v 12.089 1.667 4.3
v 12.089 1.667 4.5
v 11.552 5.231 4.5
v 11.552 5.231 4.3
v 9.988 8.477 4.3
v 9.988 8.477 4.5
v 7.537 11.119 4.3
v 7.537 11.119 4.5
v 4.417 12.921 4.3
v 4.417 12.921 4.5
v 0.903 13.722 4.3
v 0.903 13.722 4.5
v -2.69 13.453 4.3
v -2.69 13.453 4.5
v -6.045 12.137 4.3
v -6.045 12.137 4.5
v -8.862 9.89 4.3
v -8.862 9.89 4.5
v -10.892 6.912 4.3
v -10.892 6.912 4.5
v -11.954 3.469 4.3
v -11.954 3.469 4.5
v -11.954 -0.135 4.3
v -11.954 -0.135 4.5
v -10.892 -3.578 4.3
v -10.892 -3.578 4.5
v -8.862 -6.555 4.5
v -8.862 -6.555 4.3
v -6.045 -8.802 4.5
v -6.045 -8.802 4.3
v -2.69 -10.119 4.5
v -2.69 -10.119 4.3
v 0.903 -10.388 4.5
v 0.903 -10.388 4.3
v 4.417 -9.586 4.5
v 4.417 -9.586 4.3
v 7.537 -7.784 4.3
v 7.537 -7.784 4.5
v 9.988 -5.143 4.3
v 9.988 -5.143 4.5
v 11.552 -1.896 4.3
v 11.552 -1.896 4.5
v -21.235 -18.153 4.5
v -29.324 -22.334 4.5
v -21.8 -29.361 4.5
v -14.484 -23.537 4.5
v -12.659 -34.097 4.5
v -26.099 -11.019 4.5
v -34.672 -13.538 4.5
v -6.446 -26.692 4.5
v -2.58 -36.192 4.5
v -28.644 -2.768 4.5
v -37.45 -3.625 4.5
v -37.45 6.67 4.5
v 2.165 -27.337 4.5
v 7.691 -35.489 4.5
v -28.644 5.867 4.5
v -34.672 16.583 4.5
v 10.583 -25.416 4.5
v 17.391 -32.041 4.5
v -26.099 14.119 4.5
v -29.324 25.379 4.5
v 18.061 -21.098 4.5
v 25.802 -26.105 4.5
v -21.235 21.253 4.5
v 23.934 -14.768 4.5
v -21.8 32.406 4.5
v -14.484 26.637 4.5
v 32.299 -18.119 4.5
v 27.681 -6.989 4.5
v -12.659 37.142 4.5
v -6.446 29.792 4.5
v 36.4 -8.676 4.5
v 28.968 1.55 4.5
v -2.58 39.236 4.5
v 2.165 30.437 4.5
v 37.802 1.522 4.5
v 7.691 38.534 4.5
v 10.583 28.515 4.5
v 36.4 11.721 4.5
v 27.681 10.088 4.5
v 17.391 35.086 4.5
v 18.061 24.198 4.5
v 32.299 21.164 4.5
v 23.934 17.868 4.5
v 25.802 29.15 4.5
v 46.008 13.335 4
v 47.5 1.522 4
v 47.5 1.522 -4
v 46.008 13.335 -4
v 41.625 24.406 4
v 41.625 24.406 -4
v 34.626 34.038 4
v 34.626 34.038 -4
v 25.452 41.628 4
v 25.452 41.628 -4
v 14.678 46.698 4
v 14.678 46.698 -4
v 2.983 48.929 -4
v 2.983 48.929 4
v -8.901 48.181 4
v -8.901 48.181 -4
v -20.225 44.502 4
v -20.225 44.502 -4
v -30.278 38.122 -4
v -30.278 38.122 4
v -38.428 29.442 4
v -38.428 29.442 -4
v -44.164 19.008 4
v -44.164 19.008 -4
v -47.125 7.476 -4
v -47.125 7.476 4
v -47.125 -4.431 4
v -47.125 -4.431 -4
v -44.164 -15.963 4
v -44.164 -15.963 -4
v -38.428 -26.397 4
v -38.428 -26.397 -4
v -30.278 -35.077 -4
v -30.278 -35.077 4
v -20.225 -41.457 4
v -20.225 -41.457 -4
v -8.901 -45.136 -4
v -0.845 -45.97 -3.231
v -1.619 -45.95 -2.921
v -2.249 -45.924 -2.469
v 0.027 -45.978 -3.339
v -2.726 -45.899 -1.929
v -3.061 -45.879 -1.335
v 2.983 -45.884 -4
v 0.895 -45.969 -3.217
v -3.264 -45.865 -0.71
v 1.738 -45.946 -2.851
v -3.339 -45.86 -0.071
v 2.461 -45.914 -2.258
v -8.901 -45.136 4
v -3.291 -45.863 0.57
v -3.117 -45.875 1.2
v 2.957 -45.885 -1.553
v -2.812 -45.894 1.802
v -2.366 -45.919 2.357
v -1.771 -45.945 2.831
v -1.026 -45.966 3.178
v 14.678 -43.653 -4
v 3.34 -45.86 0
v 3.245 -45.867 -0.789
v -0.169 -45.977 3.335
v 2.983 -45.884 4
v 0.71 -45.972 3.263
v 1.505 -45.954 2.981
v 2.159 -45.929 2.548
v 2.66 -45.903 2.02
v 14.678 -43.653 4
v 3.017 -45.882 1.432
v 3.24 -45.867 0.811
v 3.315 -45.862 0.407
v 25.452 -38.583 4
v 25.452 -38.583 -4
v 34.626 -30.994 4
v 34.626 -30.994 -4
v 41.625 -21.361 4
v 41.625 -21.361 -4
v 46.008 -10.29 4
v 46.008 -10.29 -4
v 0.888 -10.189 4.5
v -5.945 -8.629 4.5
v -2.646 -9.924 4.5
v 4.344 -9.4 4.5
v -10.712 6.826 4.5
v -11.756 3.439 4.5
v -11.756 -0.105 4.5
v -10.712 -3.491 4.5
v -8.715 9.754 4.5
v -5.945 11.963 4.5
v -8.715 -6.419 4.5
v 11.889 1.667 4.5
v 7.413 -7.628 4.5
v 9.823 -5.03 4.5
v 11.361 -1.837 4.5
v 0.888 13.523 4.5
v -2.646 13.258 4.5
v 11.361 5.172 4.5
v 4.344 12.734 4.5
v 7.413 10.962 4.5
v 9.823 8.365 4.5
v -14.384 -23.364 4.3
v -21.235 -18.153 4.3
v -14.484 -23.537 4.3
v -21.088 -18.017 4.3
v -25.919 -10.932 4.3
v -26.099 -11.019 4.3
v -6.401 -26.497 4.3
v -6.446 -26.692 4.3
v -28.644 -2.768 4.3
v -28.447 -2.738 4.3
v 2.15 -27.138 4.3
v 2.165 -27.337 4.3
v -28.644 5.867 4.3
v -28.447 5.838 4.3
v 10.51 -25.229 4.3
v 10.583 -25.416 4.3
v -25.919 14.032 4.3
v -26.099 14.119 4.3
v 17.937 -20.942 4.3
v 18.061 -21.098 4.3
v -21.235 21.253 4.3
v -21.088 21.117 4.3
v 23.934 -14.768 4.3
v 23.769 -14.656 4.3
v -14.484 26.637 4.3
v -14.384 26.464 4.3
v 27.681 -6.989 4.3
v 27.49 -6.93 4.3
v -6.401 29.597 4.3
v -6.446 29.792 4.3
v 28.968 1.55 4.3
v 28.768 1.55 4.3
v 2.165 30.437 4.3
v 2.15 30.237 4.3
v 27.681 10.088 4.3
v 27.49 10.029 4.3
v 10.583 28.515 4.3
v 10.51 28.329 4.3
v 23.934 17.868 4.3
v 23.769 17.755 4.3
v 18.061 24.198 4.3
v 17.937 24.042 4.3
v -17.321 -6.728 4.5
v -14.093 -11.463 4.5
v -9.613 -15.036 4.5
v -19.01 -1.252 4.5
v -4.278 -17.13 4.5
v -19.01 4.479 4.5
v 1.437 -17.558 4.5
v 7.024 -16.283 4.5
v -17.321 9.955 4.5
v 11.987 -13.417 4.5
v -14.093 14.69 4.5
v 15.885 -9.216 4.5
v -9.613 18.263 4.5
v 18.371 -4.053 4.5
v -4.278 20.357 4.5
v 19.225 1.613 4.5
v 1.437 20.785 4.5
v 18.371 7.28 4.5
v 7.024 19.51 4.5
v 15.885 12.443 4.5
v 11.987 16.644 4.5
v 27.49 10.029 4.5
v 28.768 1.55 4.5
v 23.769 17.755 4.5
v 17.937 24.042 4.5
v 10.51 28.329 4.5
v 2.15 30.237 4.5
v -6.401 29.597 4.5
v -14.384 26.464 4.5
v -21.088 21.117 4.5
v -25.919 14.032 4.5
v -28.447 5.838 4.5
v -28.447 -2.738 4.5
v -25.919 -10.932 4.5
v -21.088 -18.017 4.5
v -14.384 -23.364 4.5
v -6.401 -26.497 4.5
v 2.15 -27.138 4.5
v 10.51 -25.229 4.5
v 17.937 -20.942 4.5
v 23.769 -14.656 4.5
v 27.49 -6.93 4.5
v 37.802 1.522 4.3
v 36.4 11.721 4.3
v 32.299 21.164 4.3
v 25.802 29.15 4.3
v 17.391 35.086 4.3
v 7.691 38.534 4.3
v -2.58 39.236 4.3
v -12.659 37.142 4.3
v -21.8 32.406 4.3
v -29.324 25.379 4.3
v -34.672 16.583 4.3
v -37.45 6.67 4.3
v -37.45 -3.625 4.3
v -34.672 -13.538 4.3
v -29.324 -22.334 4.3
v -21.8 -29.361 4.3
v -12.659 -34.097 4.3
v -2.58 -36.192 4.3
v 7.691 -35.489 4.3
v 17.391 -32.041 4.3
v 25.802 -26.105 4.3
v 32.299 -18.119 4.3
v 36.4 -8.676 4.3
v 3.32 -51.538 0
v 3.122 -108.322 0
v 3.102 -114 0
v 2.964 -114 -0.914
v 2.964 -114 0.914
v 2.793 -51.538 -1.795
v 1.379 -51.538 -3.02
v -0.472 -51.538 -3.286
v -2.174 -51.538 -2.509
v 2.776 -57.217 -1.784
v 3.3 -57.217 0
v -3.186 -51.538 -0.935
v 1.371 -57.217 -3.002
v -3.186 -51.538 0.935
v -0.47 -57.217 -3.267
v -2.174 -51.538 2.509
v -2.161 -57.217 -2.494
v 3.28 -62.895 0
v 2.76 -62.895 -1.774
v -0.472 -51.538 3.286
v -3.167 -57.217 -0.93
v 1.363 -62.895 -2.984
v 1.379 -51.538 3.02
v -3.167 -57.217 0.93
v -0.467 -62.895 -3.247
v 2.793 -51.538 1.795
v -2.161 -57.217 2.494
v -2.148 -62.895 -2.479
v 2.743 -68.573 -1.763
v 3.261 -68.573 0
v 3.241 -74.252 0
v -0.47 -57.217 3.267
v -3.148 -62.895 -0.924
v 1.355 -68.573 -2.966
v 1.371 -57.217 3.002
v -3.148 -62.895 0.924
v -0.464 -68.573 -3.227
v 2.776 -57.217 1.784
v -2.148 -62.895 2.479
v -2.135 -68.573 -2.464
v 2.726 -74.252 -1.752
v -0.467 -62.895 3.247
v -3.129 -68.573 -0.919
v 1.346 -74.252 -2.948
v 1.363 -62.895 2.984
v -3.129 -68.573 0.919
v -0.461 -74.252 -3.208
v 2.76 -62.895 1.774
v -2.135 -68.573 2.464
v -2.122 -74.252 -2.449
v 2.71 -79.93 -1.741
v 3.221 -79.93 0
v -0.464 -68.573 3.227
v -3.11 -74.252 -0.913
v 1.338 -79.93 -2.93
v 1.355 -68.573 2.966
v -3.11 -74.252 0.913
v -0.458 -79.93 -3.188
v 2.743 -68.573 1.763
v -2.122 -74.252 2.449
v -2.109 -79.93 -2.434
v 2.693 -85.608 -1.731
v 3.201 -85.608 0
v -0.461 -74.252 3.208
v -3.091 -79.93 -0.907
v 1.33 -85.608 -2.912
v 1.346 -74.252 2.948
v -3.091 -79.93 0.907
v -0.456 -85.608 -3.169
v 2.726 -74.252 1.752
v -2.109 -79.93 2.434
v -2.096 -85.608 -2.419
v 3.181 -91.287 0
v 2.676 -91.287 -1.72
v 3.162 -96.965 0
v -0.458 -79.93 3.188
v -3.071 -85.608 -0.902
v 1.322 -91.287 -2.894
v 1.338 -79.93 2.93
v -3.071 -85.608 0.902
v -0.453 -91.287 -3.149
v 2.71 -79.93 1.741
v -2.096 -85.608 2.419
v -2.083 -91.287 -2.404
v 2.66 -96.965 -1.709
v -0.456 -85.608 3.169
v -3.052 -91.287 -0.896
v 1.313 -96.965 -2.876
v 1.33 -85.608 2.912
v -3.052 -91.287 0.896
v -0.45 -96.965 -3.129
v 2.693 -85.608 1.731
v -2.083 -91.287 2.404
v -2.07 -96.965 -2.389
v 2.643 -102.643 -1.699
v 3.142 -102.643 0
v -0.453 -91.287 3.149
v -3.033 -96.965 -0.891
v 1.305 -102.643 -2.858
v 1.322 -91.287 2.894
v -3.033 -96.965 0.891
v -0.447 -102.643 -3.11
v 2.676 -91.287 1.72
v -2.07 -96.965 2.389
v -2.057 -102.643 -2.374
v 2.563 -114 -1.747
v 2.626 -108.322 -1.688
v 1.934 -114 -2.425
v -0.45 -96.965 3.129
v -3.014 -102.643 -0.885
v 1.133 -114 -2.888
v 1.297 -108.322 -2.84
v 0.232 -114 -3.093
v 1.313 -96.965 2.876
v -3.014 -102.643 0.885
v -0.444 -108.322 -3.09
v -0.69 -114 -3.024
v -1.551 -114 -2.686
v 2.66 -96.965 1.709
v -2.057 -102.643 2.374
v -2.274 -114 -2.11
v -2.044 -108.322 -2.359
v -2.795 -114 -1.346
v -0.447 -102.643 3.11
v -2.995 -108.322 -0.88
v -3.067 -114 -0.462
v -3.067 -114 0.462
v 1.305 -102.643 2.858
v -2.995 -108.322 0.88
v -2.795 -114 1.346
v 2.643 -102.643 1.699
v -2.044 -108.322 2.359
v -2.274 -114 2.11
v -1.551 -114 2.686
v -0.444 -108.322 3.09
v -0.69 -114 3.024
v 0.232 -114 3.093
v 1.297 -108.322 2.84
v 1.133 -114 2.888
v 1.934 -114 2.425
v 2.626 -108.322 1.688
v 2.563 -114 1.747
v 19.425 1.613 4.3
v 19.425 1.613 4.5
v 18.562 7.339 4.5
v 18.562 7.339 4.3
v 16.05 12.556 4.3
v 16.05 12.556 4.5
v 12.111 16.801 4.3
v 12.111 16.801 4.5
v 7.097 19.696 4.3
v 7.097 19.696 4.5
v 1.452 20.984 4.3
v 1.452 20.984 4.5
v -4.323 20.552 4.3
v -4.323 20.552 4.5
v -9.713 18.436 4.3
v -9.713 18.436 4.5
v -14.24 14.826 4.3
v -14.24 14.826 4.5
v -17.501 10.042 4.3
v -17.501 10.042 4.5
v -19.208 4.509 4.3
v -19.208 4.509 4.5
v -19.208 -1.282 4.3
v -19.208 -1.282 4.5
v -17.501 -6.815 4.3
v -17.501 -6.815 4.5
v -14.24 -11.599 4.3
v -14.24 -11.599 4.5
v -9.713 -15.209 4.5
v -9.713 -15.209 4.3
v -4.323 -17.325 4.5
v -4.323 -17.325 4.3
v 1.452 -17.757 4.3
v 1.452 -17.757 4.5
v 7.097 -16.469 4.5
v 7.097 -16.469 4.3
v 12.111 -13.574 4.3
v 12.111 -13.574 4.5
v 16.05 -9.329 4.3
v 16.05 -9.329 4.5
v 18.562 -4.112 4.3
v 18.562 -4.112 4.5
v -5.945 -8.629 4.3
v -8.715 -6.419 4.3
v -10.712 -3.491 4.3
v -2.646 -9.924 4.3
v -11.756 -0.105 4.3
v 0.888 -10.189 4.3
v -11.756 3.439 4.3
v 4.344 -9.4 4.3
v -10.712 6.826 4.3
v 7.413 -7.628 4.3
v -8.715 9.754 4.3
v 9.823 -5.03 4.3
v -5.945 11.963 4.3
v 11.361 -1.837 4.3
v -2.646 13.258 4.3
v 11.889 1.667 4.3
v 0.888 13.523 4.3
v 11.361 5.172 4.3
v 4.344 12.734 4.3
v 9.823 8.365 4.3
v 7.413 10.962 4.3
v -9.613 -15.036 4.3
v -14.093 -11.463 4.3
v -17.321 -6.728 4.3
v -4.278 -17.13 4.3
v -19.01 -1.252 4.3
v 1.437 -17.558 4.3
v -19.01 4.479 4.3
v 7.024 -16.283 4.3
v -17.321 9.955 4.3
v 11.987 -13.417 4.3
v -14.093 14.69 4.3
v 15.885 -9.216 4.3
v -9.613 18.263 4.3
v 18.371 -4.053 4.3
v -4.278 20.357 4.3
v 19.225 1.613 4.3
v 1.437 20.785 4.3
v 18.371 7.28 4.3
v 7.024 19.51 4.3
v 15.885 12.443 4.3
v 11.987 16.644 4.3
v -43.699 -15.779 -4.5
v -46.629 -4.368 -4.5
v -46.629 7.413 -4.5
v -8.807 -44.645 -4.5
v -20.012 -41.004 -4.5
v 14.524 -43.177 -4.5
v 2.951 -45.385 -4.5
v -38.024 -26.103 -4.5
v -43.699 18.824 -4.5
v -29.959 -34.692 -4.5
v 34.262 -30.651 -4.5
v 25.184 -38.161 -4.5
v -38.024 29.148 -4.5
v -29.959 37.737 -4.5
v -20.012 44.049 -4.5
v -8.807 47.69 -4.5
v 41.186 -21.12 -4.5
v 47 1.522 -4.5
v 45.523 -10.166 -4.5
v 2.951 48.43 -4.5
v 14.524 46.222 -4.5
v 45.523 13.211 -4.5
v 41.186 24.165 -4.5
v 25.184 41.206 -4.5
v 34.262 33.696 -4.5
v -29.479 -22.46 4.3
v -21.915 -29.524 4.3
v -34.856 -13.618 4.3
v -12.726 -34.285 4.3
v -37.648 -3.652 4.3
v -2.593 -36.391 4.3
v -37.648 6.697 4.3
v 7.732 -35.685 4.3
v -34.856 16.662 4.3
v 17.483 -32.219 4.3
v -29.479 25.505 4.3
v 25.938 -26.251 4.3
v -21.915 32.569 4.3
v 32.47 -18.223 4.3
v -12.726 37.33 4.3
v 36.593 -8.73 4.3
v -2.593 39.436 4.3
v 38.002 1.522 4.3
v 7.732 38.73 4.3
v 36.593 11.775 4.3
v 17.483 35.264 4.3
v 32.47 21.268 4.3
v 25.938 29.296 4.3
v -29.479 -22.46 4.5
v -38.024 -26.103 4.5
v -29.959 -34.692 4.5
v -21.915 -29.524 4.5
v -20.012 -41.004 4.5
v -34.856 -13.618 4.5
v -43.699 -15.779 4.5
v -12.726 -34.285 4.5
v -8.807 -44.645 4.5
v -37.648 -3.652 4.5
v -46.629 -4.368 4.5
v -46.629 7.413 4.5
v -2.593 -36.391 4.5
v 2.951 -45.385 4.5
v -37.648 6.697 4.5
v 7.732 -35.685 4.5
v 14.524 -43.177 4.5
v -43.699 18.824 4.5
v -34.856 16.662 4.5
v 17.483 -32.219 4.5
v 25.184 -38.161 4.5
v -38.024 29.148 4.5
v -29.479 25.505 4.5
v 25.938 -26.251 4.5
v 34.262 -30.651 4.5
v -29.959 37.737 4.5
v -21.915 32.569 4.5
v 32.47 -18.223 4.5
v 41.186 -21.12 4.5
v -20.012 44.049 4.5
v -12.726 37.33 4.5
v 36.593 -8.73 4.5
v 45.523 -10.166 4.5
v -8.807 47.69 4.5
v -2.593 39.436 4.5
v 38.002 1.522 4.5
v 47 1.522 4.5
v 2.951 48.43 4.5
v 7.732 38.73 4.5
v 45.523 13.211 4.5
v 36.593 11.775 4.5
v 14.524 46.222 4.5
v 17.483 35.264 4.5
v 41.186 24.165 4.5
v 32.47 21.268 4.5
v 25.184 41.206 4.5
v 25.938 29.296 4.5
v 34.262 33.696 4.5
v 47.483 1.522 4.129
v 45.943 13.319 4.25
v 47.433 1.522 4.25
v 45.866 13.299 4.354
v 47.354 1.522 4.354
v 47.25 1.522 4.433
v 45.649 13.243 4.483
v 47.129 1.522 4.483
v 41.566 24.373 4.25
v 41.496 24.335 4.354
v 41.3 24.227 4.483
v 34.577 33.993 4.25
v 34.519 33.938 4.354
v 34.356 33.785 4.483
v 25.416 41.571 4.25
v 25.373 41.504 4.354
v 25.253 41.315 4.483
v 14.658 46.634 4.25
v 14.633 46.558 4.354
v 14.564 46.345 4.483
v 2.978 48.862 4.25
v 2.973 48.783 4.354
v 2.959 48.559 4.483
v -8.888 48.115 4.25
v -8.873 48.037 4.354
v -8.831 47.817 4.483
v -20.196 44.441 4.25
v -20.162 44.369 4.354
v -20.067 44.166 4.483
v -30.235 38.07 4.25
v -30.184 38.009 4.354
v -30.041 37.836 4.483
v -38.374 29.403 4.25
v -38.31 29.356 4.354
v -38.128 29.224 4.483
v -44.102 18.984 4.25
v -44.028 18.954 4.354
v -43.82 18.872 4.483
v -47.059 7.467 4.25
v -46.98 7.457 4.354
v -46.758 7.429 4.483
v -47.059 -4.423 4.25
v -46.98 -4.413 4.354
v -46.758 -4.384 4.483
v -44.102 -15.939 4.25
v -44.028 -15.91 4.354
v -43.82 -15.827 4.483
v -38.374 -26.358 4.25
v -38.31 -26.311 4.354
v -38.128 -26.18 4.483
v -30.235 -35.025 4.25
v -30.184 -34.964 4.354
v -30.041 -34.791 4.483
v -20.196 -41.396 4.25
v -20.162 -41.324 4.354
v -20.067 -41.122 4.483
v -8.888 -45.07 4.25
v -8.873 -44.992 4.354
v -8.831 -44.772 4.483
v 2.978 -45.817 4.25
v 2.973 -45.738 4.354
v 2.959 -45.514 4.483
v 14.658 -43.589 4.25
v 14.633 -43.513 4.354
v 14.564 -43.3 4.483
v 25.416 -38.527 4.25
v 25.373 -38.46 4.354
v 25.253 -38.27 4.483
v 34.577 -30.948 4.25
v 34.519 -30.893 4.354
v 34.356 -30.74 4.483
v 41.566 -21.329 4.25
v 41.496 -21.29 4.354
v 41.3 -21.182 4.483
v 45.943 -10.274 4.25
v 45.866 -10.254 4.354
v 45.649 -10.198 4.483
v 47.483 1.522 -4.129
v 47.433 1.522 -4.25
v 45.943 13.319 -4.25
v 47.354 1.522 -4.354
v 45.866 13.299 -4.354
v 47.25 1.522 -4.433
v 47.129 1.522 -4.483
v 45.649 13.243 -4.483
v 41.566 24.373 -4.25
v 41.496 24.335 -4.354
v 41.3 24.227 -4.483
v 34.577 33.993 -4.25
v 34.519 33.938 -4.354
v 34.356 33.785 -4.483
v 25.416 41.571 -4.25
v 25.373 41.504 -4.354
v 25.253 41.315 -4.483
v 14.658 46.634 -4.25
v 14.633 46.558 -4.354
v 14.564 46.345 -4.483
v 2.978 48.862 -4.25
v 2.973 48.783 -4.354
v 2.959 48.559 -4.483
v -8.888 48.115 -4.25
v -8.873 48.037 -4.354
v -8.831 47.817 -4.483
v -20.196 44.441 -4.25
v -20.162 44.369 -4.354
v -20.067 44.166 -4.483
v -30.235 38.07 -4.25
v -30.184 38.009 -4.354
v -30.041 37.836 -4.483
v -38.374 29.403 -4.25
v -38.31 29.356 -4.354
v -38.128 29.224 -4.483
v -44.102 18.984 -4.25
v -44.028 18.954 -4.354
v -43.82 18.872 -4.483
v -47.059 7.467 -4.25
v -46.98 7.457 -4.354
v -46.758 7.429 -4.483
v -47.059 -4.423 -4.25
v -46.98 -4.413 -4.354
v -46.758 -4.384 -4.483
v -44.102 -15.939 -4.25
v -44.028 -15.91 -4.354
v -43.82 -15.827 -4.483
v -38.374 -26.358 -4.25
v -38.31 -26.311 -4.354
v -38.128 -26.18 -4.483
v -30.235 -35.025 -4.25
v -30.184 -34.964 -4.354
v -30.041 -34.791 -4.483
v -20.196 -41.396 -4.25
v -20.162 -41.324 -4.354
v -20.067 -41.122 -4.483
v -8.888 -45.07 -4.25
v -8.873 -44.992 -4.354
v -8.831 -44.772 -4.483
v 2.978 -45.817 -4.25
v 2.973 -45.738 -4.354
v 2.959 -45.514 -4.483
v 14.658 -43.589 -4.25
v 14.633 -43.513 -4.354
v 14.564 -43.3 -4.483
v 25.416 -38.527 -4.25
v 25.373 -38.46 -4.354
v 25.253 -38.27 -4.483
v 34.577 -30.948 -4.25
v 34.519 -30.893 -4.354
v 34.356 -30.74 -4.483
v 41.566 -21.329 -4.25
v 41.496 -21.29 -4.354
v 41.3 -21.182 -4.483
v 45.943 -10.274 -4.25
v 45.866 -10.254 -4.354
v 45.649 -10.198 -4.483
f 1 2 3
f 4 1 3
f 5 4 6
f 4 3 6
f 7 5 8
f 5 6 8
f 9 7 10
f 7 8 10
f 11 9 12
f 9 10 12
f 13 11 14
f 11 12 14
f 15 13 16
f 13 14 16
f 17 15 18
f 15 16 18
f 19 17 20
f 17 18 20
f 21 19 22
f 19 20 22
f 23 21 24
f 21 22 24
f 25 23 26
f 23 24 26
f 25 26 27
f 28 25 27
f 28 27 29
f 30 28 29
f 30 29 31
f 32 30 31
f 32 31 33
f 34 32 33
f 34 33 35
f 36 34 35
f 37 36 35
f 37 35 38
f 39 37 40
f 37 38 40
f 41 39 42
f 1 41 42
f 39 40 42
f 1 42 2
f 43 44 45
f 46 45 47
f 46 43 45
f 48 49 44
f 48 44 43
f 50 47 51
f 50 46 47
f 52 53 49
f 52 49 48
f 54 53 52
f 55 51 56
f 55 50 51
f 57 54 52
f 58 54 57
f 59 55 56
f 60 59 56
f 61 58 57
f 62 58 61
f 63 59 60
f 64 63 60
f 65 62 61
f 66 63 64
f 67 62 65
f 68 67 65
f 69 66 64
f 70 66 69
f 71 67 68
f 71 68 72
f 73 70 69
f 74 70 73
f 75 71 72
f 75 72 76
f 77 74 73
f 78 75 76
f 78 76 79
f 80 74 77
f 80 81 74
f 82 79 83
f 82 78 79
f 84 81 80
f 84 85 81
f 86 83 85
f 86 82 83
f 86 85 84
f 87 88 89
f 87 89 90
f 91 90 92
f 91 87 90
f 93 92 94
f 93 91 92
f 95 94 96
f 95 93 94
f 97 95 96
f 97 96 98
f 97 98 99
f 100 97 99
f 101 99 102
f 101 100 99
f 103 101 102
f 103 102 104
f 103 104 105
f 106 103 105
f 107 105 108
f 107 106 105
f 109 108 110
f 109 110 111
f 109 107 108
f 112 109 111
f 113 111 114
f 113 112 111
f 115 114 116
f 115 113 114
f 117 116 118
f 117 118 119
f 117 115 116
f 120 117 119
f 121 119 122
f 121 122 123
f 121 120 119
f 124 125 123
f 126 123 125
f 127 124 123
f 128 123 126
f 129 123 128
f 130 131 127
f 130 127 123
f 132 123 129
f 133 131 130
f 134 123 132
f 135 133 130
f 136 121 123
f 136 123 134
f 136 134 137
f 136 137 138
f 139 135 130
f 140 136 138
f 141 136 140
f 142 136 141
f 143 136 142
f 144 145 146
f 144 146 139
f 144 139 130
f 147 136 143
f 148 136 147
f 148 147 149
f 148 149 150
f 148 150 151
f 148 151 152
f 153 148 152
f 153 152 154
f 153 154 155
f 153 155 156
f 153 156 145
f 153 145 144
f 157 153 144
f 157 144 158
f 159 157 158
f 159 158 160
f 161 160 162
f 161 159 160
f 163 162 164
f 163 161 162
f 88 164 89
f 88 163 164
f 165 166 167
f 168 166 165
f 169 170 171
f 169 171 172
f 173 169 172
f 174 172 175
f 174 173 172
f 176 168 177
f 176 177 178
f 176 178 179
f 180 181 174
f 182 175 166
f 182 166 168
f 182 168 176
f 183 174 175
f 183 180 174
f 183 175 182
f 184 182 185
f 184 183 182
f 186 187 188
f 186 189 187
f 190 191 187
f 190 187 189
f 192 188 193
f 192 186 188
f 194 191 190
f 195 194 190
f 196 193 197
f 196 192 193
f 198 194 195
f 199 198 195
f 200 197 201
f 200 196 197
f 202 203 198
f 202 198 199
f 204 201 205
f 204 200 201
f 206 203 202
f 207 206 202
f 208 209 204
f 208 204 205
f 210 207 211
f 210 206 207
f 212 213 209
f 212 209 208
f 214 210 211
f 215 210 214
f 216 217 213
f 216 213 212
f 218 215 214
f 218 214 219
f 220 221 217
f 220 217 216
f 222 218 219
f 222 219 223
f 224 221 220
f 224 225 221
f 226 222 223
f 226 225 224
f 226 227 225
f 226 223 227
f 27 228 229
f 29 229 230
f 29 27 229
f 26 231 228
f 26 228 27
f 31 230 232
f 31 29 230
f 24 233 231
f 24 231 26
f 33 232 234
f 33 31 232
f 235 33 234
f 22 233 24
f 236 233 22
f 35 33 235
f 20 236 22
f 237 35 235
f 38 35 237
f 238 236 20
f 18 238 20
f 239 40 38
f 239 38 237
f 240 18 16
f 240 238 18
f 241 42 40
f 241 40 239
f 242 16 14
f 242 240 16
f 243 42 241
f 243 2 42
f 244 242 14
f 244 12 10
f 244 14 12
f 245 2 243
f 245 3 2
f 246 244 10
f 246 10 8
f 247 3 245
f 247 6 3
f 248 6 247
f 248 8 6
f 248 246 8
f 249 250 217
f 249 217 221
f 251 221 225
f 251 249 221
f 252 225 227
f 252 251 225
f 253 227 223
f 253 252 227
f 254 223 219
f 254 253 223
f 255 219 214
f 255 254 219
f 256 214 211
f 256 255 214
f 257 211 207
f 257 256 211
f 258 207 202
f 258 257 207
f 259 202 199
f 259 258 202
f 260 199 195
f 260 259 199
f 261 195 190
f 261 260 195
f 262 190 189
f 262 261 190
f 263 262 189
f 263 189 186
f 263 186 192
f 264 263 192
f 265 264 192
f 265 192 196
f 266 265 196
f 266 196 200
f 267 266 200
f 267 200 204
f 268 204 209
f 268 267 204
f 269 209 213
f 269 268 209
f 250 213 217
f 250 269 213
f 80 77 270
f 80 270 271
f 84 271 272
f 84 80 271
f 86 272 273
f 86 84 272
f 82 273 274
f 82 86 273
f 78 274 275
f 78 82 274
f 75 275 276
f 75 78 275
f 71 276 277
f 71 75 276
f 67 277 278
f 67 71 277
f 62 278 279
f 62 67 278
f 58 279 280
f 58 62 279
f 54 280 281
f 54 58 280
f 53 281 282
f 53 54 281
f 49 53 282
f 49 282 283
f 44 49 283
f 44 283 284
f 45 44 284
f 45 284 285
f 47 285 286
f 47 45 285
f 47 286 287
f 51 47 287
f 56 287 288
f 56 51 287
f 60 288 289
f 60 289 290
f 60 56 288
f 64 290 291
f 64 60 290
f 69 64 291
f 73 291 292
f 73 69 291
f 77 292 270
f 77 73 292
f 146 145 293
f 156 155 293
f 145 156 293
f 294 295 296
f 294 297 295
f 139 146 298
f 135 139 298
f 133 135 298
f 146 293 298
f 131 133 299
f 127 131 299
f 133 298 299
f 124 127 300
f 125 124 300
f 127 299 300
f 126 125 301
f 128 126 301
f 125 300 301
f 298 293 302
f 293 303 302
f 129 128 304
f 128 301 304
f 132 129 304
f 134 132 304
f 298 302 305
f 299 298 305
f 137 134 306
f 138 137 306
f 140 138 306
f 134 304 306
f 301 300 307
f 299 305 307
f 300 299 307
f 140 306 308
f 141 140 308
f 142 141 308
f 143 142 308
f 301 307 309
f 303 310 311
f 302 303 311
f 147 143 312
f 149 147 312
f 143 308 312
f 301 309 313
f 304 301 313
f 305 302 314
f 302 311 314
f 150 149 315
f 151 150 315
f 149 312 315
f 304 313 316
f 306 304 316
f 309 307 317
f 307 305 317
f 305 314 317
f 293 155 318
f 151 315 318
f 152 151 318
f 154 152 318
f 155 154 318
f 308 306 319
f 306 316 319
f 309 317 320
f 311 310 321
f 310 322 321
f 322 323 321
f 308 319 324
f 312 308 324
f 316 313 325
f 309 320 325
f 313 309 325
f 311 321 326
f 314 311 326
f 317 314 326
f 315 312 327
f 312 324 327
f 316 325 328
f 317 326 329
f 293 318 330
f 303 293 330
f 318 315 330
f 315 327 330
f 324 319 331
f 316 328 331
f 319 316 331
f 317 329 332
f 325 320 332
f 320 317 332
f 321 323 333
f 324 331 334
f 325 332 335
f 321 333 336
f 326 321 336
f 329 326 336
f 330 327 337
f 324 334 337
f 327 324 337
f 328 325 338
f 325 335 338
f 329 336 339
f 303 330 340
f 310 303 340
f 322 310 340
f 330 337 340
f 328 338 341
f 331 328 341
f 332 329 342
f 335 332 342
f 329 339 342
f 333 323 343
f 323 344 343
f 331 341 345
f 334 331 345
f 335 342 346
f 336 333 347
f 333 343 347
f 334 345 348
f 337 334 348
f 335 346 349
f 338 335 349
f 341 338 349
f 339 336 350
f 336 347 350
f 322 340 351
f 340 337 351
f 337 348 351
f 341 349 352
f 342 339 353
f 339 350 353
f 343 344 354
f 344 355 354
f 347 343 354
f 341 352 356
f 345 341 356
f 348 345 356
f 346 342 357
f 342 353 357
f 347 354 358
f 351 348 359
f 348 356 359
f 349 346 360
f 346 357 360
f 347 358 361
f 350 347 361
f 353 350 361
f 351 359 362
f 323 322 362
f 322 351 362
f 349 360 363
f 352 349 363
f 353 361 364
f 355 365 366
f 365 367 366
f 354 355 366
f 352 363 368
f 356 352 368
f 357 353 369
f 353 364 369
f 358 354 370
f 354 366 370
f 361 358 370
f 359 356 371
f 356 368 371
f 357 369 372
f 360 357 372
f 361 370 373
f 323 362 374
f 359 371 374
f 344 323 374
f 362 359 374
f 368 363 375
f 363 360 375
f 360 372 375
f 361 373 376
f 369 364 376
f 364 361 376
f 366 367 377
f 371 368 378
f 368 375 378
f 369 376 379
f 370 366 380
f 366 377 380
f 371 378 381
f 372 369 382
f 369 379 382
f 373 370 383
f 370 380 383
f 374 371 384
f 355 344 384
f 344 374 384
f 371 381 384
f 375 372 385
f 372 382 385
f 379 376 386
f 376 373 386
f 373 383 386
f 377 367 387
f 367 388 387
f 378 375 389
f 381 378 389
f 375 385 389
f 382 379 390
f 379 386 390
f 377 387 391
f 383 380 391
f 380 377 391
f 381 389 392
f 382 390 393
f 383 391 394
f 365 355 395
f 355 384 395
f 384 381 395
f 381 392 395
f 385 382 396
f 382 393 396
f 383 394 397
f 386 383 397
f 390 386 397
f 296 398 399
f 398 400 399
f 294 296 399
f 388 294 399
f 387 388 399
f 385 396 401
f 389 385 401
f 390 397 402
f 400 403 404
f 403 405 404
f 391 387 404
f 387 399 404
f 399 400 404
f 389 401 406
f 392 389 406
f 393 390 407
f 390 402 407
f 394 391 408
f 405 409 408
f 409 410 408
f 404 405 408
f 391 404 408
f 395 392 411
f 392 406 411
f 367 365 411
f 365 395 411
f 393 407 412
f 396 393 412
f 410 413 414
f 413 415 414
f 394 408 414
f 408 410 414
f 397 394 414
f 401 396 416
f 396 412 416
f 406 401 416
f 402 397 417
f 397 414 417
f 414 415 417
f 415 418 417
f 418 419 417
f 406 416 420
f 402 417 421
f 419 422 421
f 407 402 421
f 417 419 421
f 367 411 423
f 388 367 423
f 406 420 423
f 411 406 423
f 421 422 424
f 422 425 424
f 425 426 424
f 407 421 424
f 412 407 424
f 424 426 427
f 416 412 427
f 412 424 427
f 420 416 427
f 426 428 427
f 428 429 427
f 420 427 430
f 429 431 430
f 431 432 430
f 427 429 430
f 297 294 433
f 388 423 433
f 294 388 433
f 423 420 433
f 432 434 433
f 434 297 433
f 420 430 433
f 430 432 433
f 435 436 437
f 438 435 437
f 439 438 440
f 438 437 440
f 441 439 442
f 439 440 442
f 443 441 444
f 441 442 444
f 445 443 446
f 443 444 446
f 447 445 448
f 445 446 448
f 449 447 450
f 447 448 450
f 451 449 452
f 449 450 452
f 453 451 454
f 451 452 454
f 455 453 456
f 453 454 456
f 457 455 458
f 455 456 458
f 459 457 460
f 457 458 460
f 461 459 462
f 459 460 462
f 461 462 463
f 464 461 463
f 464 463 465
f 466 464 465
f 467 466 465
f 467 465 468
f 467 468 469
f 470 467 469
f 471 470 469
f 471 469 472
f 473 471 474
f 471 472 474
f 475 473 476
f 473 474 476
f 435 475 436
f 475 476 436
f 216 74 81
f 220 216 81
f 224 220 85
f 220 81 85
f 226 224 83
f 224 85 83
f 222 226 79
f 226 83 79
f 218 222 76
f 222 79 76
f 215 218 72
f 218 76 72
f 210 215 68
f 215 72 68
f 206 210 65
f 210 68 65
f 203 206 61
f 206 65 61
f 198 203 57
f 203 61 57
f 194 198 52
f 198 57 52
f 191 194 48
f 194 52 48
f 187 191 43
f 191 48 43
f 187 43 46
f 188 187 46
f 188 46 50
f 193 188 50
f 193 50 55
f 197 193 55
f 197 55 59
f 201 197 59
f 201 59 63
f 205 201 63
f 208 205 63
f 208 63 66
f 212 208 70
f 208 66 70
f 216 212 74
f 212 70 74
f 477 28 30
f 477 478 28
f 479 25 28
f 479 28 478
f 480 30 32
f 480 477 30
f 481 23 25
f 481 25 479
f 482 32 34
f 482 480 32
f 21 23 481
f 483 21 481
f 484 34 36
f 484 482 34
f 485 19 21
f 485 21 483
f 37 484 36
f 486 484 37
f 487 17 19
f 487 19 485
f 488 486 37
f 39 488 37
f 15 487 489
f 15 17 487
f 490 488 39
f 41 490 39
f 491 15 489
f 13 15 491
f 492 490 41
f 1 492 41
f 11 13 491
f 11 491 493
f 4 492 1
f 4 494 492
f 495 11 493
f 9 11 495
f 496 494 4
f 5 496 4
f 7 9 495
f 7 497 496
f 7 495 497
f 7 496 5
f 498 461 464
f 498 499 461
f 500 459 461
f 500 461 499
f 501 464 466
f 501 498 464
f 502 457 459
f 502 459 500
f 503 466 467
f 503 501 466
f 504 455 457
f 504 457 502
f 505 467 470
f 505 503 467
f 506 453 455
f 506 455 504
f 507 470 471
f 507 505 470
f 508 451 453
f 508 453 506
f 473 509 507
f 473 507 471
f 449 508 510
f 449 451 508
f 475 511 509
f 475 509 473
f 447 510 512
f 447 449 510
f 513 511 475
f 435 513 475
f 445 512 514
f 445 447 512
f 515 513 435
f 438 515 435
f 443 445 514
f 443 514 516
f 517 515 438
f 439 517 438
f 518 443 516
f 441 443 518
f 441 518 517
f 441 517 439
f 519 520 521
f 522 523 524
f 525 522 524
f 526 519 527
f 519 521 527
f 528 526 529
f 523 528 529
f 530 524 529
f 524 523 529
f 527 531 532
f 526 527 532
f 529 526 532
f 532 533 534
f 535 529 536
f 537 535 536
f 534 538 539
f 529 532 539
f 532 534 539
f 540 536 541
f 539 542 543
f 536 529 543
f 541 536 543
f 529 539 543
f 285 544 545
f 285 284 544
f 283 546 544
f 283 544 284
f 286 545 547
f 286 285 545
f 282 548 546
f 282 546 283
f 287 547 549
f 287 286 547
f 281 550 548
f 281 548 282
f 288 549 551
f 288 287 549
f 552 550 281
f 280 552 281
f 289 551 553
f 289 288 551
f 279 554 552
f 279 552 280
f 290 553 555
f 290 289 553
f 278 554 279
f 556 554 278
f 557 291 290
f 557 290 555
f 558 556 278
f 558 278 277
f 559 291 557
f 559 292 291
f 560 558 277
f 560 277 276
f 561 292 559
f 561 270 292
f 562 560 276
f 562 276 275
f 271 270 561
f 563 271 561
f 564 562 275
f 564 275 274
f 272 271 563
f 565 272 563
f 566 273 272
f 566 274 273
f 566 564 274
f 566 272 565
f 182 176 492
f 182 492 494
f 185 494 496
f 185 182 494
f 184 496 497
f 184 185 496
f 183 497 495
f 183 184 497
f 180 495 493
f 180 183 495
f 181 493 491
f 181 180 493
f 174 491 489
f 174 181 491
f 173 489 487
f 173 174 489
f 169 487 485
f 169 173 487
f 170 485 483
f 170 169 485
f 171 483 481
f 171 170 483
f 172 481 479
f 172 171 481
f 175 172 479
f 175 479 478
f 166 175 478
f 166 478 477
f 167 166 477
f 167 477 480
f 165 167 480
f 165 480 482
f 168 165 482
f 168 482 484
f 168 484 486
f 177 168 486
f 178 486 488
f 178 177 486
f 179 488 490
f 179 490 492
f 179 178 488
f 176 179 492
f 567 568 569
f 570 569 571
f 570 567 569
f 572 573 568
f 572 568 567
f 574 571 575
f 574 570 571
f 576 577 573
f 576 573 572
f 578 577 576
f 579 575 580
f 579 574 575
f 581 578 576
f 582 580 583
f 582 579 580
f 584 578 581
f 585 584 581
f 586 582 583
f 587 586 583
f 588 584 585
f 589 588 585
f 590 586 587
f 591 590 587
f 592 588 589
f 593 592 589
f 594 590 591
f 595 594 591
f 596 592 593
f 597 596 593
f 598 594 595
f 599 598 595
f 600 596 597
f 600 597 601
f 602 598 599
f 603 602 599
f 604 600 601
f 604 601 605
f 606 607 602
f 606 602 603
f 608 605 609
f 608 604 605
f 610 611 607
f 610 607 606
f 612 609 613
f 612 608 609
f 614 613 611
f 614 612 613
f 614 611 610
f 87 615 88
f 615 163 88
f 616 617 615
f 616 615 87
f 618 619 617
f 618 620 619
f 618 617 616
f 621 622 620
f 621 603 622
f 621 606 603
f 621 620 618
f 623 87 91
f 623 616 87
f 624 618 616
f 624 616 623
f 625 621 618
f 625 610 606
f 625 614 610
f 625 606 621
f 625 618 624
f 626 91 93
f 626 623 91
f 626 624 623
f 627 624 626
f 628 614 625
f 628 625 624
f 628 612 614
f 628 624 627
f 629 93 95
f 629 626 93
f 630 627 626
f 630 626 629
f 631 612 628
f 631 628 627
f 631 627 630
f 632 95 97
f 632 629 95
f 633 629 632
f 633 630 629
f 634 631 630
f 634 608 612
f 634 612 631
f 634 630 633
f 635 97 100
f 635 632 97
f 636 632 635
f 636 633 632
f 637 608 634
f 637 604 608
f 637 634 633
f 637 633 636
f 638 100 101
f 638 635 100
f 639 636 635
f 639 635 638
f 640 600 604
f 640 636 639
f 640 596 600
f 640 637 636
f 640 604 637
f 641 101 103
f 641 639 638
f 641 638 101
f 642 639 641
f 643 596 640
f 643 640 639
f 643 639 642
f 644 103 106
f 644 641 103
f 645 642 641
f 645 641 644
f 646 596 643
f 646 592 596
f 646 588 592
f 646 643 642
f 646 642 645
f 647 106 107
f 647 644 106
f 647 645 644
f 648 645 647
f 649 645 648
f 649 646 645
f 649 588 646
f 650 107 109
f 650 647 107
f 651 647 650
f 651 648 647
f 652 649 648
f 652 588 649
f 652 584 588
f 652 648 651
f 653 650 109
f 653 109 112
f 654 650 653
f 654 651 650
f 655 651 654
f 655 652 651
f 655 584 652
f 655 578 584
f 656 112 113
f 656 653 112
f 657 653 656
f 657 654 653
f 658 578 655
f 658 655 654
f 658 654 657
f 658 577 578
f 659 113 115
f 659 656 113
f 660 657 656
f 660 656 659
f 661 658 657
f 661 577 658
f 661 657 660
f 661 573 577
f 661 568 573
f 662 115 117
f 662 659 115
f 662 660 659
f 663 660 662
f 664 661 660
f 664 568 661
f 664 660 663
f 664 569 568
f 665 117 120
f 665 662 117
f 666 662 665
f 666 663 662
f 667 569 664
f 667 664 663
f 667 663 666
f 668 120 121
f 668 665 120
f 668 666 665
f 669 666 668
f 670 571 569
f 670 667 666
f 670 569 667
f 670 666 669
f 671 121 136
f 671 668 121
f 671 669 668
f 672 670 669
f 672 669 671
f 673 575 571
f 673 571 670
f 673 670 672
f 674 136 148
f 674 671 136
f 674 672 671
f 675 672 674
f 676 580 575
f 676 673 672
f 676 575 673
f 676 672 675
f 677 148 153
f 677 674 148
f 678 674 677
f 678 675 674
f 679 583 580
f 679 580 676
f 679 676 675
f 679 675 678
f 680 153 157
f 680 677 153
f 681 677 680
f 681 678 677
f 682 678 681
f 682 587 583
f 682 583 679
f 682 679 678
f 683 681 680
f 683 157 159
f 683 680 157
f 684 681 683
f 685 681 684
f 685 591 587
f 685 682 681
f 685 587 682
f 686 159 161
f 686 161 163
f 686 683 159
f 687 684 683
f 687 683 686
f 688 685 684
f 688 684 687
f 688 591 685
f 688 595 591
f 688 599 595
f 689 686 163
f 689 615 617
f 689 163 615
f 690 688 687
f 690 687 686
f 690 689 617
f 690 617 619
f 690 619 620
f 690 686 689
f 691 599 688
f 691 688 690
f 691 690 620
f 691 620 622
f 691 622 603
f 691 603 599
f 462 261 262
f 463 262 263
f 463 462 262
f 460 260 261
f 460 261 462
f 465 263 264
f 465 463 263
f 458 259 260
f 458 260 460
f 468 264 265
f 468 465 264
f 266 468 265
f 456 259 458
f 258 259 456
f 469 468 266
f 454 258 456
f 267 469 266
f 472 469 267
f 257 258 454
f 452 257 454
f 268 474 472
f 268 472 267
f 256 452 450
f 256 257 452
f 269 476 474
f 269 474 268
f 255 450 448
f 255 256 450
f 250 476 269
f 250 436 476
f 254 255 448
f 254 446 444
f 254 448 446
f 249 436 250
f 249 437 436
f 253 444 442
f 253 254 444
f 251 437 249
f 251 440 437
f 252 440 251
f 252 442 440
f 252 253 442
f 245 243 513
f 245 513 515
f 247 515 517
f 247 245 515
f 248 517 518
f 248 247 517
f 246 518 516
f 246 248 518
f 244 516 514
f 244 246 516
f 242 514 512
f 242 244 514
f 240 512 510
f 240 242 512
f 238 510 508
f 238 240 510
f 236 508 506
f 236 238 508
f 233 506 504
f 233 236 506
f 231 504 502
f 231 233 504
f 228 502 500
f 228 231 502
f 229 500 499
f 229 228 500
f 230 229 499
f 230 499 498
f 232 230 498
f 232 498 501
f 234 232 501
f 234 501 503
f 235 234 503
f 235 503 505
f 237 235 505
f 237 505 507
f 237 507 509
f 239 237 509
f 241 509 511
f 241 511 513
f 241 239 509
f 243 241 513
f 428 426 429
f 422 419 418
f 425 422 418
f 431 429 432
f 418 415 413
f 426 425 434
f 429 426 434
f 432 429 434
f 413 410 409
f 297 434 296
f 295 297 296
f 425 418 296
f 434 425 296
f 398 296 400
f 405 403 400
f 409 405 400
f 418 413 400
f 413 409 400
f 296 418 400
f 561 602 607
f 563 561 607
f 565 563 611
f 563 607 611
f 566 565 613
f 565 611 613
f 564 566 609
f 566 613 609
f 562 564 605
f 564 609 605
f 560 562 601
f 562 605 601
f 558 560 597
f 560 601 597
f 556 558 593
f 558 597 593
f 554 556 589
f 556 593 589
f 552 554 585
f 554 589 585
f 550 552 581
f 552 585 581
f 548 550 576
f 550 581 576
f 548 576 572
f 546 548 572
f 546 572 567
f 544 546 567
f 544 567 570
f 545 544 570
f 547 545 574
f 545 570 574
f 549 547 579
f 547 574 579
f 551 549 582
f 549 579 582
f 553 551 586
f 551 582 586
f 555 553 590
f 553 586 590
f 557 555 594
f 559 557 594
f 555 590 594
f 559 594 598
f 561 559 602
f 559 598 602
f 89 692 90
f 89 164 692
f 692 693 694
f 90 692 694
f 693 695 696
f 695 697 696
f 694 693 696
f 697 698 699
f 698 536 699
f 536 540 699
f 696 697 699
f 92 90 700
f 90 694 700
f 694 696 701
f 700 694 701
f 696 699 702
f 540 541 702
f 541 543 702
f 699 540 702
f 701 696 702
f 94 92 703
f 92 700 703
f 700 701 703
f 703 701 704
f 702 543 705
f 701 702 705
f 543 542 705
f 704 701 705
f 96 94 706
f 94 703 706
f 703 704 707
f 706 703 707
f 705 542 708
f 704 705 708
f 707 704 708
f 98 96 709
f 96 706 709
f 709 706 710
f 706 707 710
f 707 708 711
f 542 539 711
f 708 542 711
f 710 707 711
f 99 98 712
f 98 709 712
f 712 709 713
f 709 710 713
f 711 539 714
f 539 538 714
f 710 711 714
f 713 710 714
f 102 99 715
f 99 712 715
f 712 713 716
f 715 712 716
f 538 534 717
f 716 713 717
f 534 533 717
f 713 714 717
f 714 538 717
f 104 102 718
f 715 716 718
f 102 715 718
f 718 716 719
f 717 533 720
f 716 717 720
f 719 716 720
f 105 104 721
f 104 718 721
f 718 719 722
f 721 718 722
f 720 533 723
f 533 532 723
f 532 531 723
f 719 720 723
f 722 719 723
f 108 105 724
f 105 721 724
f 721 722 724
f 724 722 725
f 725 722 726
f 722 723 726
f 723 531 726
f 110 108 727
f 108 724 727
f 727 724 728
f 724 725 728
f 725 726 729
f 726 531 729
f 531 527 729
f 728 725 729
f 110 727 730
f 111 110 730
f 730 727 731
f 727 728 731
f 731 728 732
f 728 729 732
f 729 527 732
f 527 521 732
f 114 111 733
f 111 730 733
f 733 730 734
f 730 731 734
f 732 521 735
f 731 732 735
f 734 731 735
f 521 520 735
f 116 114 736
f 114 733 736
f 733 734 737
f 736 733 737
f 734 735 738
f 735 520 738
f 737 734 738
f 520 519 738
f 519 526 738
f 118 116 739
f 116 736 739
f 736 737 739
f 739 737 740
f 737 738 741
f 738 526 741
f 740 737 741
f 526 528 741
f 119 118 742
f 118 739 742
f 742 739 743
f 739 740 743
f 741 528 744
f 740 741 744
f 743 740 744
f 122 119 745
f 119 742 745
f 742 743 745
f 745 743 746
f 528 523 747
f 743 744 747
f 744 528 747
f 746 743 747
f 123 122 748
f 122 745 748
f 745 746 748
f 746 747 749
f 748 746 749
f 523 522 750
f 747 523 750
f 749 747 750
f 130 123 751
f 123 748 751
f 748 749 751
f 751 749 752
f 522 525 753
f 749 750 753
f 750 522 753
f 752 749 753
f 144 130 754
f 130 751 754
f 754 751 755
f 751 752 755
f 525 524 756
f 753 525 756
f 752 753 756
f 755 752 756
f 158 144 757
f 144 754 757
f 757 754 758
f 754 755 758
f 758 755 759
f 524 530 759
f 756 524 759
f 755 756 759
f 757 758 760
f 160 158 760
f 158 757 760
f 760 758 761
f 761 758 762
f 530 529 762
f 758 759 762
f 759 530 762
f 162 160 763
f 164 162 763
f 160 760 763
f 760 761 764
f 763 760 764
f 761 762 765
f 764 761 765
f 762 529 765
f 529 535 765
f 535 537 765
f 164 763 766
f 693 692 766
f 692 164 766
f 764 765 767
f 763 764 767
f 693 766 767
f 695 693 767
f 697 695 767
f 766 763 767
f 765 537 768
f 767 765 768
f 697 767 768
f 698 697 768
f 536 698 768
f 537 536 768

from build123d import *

# Parameters (mm, degrees)
F0_R      = 47.5
F1_DEPTH  = 4.5
F2_R      = 3.5
F3_DEPTH  = 114
F3_TAPER  = 0.2
F4_R      = 0.5
F5_R      = 38.002083118
F5_R_2    = 37.802083118
F6_DEPTH  = 0.2
F7_R      = 28.9679765701
F7_R_2    = 28.767975761
F8_DEPTH  = 0.2
F9_R      = 19.4251779467
F9_R_2    = 19.2251771527
F10_DEPTH = 0.2
F11_R     = 12.0890308172
F11_R_2   = 11.8890312486
F12_DEPTH = 0.2
F14_ANGLE = -90


with BuildPart() as f1:
    # F0 (on Front) → F1 (new body, symmetric)
    with BuildSketch(Plane.XZ):
        with Locations((0, 1.5224246528)):
            Circle(F0_R)
    extrude(amount=F1_DEPTH, both=True)

    # F2 (on Top) → F3 (join)
    with BuildSketch(Plane.XY):
        Circle(F2_R)
    extrude(amount=-F3_DEPTH, taper=F3_TAPER)

    # F4
    f4_edges = [f1.edges().sort_by_distance(p)[0] for p in [
        (-47.5, -4.5, 1.522425),
        (-47.5, 4.5, 1.522425),
    ]]
    fillet(f4_edges, radius=F4_R)

    # F5 (on face) → F6 (cut)
    with BuildSketch(Plane.XZ.offset(4.5)):
        with Locations((0, 1.5224246528)):
            Circle(F5_R)
        with Locations((0, 1.5224246528)):
            Circle(F5_R_2, mode=Mode.SUBTRACT)
    extrude(amount=-F6_DEPTH, mode=Mode.SUBTRACT)

    # F7 (on face) → F8 (cut)
    with BuildSketch(Plane.XZ.offset(4.5)):
        with Locations((0, 1.5499041183)):
            Circle(F7_R)
        with Locations((0, 1.5499041183)):
            Circle(F7_R_2, mode=Mode.SUBTRACT)
    extrude(amount=-F8_DEPTH, mode=Mode.SUBTRACT)

    # F9 (on face) → F10 (cut)
    with BuildSketch(Plane.XZ.offset(4.5)):
        with Locations((0, 1.613457338)):
            Circle(F9_R)
        with Locations((0, 1.613457338)):
            Circle(F9_R_2, mode=Mode.SUBTRACT)
    extrude(amount=-F10_DEPTH, mode=Mode.SUBTRACT)

    # F11 (on face) → F12 (cut)
    with BuildSketch(Plane.XZ.offset(4.5)):
        with Locations((0, 1.6672129277)):
            Circle(F11_R)
        with Locations((0, 1.6672129277)):
            Circle(F11_R_2, mode=Mode.SUBTRACT)
    extrude(amount=-F12_DEPTH, mode=Mode.SUBTRACT)


with BuildPart() as f1_1:
    # F14: moved
    add(f1.part.rotate(Axis((14.7541314363, 0, 0), (1, 0, 0)), F14_ANGLE))


solid = f1_1.part
